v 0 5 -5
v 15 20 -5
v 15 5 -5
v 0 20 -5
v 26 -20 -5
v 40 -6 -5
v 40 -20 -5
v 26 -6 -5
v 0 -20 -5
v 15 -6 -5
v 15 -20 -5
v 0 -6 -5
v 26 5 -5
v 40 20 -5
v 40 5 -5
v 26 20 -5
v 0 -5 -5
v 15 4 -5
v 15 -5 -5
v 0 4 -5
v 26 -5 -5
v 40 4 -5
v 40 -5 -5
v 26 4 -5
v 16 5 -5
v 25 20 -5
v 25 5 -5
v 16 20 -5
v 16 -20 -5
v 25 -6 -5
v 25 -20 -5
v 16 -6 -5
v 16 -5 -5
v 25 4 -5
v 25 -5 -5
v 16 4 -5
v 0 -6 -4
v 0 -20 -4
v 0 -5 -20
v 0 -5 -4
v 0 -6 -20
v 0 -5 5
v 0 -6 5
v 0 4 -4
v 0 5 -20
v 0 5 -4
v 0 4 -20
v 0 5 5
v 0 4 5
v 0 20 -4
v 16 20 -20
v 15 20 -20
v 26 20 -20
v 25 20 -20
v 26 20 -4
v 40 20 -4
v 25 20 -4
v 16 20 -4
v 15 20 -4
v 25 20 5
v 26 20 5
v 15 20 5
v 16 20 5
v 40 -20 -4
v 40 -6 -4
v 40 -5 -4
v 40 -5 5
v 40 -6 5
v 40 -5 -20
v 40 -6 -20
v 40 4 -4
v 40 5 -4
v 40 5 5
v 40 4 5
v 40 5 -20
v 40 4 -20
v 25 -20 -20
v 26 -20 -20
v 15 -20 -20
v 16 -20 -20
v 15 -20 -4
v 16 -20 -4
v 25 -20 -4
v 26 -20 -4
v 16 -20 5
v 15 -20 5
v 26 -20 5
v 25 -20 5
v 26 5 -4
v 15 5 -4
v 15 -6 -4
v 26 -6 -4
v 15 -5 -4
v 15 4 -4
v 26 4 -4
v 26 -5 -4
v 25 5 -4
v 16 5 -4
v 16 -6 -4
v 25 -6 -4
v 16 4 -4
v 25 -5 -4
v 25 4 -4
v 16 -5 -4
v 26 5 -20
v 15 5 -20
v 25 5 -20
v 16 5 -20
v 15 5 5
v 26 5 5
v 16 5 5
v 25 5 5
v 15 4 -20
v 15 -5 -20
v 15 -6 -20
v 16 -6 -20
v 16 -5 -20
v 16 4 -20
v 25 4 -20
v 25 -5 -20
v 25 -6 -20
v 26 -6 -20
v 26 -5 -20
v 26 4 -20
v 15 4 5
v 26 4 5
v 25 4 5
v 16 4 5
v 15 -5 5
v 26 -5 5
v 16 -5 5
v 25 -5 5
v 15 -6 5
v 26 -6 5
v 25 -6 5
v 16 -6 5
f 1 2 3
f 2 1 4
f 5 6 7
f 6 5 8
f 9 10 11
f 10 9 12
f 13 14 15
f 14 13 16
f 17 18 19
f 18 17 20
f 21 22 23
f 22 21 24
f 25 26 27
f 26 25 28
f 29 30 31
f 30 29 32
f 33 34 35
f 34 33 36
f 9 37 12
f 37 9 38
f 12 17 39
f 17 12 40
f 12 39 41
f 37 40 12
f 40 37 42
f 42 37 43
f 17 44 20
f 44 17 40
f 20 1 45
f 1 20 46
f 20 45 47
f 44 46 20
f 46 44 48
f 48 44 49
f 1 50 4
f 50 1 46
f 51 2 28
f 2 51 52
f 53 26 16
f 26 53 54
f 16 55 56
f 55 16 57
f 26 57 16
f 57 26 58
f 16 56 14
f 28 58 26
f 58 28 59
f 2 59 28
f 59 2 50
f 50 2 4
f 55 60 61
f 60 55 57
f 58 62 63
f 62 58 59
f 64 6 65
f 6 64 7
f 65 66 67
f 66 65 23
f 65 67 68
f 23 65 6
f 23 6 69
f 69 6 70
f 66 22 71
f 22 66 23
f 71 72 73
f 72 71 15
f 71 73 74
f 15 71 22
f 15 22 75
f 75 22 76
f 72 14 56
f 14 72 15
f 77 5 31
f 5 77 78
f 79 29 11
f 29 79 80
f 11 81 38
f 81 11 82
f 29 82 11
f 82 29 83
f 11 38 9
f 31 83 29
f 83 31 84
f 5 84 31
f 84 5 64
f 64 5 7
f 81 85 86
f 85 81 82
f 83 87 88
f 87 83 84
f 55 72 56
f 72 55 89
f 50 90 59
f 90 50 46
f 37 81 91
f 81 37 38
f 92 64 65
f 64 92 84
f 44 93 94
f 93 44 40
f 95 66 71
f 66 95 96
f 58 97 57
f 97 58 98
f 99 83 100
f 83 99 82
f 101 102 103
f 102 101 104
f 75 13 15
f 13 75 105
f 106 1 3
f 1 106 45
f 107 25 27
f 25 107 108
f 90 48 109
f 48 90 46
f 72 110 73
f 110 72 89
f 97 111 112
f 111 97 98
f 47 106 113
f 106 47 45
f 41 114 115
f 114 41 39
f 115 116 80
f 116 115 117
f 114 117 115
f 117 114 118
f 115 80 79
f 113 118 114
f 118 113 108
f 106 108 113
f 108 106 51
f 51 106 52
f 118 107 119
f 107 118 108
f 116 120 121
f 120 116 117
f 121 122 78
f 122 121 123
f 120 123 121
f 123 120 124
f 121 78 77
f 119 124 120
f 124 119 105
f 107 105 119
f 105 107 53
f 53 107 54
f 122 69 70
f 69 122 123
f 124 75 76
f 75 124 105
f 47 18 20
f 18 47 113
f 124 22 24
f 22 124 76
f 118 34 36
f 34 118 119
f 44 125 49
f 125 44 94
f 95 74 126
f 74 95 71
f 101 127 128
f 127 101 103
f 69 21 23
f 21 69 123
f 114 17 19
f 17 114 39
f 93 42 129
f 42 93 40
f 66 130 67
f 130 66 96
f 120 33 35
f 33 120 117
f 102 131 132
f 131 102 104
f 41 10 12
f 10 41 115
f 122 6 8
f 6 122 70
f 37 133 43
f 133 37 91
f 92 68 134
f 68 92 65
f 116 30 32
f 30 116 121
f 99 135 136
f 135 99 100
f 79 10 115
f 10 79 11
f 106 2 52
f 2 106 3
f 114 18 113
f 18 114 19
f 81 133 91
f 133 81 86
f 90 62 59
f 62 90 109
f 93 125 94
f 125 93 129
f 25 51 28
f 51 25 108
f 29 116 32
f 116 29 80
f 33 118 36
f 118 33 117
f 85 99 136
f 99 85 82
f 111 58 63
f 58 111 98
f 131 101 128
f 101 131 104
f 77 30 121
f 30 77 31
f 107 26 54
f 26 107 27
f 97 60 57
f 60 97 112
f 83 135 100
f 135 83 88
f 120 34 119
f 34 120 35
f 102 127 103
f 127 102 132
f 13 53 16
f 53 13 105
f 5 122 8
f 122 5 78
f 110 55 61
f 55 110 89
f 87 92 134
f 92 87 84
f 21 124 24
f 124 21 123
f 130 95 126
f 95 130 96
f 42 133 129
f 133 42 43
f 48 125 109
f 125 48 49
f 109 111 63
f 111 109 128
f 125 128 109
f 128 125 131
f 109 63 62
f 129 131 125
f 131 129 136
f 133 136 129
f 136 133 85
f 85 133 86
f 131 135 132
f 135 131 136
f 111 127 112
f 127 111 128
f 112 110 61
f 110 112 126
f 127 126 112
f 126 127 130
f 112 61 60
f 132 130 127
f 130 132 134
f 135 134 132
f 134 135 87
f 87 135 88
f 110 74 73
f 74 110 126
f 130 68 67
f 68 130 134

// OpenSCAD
module push(x)
{
    if (x > 0)
    {
        linear_extrude(x) children(0);
    }
    else
    {
        translate([ 0, 0, x ]) linear_extrude(x * -1) children(0);
    }
}
// module mk()
// {
//     push(10) square([ 10, 10 ]);
// }

// // simple cube
// color("green") translate([ 20, 0, 0 ]) mk();

// // create smaller copy manually
// difference()
// {
//     color("lightgreen") translate([ 0, 20, 0 ]) mk();
//     translate([ 1, 21, 1 ]) push(8) square([ 8, 8 ]);
//     push(1) projection() translate([ 0, 20, 0 ]) mk();
// }

// // scale
// difference()
// {
//     color("lightblue") translate([ 0, 40, 0 ]) mk();
//     translate([ 1, 41, 1 ]) scale([ 0.8, 0.8, 0.8 ]) mk();
//     push(1) projection() translate([ 0, 40, 0 ]) mk();
// }

// // minkovsky
// scale([ 0.9, 0.9, 0.9 ]) difference()
// {
//     minkowski()
//     {
//         mk();
//         sphere(r = 1);
//     }
//     mk();
//     // translate([ 0, 0, caseThikness ]) mk();
//     push(-100) square([ 100, 100 ]);
// }

// // piece by piece
// module t4()
// {
//     translate([ -15, 0, 0 ]) children(0);
// }
// wall = 1;

// t4() union()
// {
//     cube([ wall, 10, 10 ]);
//     cube([ 10, wall, 10 ]);
//     cube([ 10, 10, wall ]);
//     translate([ 0, 0, 9 ]) cube([ 10, 10, wall ]);
//     translate([ 0, 9, 0 ]) cube([ 10, wall, 10 ]);
// }

// wall by wall
module cut(size)
{

    if (size > 0)
    {
        push(size) square([ size, size ], center = true);
    }
    else
    {
        push(size) square([ -size, -size ], center = true);
    }
}

module wall(thikness, size)
{
    intersection()
    {
        cut(size);
        translate([ 0, 0, thikness ]) cut(-size);
    }
}

thick = 1;
size = 40;
module bo()
{
    translate([ 20, 0, -5 ]) children(0);
}
module l()
{
    translate([ 20, 5, 0 ]) rotate([ 90, 0, 0 ]) children(0);
}
module r()
{
    translate([ 20, -5, 0 ]) rotate([ 90, 0, 0 ]) children(0);
}
module f()
{
    translate([ 20 - 5, 0, 0 ]) rotate([ 0, 90, 0 ]) children(0);
}
module ba()
{
    translate([ 20 + 5, 0, 0 ]) rotate([ 0, 90, 0 ]) children(0);
}
module t()
{
    translate([ 20, 0, +5 ]) children(0);
}

difference()
{
    union()
    {
        bo() wall(thick, size);
        l() wall(thick, size);
        r() wall(thick, size);
        f() wall(thick, size);
        ba() wall(thick, size);
        t() wall(thick, size);
    }
    t() cut(size);
}
// translate([ 20, 0, 0 ]) rotate([ 0, 90, 0 ]) wall(thick, size);
// translate([ 20, 0, 0 ]) wall(thick, size);
